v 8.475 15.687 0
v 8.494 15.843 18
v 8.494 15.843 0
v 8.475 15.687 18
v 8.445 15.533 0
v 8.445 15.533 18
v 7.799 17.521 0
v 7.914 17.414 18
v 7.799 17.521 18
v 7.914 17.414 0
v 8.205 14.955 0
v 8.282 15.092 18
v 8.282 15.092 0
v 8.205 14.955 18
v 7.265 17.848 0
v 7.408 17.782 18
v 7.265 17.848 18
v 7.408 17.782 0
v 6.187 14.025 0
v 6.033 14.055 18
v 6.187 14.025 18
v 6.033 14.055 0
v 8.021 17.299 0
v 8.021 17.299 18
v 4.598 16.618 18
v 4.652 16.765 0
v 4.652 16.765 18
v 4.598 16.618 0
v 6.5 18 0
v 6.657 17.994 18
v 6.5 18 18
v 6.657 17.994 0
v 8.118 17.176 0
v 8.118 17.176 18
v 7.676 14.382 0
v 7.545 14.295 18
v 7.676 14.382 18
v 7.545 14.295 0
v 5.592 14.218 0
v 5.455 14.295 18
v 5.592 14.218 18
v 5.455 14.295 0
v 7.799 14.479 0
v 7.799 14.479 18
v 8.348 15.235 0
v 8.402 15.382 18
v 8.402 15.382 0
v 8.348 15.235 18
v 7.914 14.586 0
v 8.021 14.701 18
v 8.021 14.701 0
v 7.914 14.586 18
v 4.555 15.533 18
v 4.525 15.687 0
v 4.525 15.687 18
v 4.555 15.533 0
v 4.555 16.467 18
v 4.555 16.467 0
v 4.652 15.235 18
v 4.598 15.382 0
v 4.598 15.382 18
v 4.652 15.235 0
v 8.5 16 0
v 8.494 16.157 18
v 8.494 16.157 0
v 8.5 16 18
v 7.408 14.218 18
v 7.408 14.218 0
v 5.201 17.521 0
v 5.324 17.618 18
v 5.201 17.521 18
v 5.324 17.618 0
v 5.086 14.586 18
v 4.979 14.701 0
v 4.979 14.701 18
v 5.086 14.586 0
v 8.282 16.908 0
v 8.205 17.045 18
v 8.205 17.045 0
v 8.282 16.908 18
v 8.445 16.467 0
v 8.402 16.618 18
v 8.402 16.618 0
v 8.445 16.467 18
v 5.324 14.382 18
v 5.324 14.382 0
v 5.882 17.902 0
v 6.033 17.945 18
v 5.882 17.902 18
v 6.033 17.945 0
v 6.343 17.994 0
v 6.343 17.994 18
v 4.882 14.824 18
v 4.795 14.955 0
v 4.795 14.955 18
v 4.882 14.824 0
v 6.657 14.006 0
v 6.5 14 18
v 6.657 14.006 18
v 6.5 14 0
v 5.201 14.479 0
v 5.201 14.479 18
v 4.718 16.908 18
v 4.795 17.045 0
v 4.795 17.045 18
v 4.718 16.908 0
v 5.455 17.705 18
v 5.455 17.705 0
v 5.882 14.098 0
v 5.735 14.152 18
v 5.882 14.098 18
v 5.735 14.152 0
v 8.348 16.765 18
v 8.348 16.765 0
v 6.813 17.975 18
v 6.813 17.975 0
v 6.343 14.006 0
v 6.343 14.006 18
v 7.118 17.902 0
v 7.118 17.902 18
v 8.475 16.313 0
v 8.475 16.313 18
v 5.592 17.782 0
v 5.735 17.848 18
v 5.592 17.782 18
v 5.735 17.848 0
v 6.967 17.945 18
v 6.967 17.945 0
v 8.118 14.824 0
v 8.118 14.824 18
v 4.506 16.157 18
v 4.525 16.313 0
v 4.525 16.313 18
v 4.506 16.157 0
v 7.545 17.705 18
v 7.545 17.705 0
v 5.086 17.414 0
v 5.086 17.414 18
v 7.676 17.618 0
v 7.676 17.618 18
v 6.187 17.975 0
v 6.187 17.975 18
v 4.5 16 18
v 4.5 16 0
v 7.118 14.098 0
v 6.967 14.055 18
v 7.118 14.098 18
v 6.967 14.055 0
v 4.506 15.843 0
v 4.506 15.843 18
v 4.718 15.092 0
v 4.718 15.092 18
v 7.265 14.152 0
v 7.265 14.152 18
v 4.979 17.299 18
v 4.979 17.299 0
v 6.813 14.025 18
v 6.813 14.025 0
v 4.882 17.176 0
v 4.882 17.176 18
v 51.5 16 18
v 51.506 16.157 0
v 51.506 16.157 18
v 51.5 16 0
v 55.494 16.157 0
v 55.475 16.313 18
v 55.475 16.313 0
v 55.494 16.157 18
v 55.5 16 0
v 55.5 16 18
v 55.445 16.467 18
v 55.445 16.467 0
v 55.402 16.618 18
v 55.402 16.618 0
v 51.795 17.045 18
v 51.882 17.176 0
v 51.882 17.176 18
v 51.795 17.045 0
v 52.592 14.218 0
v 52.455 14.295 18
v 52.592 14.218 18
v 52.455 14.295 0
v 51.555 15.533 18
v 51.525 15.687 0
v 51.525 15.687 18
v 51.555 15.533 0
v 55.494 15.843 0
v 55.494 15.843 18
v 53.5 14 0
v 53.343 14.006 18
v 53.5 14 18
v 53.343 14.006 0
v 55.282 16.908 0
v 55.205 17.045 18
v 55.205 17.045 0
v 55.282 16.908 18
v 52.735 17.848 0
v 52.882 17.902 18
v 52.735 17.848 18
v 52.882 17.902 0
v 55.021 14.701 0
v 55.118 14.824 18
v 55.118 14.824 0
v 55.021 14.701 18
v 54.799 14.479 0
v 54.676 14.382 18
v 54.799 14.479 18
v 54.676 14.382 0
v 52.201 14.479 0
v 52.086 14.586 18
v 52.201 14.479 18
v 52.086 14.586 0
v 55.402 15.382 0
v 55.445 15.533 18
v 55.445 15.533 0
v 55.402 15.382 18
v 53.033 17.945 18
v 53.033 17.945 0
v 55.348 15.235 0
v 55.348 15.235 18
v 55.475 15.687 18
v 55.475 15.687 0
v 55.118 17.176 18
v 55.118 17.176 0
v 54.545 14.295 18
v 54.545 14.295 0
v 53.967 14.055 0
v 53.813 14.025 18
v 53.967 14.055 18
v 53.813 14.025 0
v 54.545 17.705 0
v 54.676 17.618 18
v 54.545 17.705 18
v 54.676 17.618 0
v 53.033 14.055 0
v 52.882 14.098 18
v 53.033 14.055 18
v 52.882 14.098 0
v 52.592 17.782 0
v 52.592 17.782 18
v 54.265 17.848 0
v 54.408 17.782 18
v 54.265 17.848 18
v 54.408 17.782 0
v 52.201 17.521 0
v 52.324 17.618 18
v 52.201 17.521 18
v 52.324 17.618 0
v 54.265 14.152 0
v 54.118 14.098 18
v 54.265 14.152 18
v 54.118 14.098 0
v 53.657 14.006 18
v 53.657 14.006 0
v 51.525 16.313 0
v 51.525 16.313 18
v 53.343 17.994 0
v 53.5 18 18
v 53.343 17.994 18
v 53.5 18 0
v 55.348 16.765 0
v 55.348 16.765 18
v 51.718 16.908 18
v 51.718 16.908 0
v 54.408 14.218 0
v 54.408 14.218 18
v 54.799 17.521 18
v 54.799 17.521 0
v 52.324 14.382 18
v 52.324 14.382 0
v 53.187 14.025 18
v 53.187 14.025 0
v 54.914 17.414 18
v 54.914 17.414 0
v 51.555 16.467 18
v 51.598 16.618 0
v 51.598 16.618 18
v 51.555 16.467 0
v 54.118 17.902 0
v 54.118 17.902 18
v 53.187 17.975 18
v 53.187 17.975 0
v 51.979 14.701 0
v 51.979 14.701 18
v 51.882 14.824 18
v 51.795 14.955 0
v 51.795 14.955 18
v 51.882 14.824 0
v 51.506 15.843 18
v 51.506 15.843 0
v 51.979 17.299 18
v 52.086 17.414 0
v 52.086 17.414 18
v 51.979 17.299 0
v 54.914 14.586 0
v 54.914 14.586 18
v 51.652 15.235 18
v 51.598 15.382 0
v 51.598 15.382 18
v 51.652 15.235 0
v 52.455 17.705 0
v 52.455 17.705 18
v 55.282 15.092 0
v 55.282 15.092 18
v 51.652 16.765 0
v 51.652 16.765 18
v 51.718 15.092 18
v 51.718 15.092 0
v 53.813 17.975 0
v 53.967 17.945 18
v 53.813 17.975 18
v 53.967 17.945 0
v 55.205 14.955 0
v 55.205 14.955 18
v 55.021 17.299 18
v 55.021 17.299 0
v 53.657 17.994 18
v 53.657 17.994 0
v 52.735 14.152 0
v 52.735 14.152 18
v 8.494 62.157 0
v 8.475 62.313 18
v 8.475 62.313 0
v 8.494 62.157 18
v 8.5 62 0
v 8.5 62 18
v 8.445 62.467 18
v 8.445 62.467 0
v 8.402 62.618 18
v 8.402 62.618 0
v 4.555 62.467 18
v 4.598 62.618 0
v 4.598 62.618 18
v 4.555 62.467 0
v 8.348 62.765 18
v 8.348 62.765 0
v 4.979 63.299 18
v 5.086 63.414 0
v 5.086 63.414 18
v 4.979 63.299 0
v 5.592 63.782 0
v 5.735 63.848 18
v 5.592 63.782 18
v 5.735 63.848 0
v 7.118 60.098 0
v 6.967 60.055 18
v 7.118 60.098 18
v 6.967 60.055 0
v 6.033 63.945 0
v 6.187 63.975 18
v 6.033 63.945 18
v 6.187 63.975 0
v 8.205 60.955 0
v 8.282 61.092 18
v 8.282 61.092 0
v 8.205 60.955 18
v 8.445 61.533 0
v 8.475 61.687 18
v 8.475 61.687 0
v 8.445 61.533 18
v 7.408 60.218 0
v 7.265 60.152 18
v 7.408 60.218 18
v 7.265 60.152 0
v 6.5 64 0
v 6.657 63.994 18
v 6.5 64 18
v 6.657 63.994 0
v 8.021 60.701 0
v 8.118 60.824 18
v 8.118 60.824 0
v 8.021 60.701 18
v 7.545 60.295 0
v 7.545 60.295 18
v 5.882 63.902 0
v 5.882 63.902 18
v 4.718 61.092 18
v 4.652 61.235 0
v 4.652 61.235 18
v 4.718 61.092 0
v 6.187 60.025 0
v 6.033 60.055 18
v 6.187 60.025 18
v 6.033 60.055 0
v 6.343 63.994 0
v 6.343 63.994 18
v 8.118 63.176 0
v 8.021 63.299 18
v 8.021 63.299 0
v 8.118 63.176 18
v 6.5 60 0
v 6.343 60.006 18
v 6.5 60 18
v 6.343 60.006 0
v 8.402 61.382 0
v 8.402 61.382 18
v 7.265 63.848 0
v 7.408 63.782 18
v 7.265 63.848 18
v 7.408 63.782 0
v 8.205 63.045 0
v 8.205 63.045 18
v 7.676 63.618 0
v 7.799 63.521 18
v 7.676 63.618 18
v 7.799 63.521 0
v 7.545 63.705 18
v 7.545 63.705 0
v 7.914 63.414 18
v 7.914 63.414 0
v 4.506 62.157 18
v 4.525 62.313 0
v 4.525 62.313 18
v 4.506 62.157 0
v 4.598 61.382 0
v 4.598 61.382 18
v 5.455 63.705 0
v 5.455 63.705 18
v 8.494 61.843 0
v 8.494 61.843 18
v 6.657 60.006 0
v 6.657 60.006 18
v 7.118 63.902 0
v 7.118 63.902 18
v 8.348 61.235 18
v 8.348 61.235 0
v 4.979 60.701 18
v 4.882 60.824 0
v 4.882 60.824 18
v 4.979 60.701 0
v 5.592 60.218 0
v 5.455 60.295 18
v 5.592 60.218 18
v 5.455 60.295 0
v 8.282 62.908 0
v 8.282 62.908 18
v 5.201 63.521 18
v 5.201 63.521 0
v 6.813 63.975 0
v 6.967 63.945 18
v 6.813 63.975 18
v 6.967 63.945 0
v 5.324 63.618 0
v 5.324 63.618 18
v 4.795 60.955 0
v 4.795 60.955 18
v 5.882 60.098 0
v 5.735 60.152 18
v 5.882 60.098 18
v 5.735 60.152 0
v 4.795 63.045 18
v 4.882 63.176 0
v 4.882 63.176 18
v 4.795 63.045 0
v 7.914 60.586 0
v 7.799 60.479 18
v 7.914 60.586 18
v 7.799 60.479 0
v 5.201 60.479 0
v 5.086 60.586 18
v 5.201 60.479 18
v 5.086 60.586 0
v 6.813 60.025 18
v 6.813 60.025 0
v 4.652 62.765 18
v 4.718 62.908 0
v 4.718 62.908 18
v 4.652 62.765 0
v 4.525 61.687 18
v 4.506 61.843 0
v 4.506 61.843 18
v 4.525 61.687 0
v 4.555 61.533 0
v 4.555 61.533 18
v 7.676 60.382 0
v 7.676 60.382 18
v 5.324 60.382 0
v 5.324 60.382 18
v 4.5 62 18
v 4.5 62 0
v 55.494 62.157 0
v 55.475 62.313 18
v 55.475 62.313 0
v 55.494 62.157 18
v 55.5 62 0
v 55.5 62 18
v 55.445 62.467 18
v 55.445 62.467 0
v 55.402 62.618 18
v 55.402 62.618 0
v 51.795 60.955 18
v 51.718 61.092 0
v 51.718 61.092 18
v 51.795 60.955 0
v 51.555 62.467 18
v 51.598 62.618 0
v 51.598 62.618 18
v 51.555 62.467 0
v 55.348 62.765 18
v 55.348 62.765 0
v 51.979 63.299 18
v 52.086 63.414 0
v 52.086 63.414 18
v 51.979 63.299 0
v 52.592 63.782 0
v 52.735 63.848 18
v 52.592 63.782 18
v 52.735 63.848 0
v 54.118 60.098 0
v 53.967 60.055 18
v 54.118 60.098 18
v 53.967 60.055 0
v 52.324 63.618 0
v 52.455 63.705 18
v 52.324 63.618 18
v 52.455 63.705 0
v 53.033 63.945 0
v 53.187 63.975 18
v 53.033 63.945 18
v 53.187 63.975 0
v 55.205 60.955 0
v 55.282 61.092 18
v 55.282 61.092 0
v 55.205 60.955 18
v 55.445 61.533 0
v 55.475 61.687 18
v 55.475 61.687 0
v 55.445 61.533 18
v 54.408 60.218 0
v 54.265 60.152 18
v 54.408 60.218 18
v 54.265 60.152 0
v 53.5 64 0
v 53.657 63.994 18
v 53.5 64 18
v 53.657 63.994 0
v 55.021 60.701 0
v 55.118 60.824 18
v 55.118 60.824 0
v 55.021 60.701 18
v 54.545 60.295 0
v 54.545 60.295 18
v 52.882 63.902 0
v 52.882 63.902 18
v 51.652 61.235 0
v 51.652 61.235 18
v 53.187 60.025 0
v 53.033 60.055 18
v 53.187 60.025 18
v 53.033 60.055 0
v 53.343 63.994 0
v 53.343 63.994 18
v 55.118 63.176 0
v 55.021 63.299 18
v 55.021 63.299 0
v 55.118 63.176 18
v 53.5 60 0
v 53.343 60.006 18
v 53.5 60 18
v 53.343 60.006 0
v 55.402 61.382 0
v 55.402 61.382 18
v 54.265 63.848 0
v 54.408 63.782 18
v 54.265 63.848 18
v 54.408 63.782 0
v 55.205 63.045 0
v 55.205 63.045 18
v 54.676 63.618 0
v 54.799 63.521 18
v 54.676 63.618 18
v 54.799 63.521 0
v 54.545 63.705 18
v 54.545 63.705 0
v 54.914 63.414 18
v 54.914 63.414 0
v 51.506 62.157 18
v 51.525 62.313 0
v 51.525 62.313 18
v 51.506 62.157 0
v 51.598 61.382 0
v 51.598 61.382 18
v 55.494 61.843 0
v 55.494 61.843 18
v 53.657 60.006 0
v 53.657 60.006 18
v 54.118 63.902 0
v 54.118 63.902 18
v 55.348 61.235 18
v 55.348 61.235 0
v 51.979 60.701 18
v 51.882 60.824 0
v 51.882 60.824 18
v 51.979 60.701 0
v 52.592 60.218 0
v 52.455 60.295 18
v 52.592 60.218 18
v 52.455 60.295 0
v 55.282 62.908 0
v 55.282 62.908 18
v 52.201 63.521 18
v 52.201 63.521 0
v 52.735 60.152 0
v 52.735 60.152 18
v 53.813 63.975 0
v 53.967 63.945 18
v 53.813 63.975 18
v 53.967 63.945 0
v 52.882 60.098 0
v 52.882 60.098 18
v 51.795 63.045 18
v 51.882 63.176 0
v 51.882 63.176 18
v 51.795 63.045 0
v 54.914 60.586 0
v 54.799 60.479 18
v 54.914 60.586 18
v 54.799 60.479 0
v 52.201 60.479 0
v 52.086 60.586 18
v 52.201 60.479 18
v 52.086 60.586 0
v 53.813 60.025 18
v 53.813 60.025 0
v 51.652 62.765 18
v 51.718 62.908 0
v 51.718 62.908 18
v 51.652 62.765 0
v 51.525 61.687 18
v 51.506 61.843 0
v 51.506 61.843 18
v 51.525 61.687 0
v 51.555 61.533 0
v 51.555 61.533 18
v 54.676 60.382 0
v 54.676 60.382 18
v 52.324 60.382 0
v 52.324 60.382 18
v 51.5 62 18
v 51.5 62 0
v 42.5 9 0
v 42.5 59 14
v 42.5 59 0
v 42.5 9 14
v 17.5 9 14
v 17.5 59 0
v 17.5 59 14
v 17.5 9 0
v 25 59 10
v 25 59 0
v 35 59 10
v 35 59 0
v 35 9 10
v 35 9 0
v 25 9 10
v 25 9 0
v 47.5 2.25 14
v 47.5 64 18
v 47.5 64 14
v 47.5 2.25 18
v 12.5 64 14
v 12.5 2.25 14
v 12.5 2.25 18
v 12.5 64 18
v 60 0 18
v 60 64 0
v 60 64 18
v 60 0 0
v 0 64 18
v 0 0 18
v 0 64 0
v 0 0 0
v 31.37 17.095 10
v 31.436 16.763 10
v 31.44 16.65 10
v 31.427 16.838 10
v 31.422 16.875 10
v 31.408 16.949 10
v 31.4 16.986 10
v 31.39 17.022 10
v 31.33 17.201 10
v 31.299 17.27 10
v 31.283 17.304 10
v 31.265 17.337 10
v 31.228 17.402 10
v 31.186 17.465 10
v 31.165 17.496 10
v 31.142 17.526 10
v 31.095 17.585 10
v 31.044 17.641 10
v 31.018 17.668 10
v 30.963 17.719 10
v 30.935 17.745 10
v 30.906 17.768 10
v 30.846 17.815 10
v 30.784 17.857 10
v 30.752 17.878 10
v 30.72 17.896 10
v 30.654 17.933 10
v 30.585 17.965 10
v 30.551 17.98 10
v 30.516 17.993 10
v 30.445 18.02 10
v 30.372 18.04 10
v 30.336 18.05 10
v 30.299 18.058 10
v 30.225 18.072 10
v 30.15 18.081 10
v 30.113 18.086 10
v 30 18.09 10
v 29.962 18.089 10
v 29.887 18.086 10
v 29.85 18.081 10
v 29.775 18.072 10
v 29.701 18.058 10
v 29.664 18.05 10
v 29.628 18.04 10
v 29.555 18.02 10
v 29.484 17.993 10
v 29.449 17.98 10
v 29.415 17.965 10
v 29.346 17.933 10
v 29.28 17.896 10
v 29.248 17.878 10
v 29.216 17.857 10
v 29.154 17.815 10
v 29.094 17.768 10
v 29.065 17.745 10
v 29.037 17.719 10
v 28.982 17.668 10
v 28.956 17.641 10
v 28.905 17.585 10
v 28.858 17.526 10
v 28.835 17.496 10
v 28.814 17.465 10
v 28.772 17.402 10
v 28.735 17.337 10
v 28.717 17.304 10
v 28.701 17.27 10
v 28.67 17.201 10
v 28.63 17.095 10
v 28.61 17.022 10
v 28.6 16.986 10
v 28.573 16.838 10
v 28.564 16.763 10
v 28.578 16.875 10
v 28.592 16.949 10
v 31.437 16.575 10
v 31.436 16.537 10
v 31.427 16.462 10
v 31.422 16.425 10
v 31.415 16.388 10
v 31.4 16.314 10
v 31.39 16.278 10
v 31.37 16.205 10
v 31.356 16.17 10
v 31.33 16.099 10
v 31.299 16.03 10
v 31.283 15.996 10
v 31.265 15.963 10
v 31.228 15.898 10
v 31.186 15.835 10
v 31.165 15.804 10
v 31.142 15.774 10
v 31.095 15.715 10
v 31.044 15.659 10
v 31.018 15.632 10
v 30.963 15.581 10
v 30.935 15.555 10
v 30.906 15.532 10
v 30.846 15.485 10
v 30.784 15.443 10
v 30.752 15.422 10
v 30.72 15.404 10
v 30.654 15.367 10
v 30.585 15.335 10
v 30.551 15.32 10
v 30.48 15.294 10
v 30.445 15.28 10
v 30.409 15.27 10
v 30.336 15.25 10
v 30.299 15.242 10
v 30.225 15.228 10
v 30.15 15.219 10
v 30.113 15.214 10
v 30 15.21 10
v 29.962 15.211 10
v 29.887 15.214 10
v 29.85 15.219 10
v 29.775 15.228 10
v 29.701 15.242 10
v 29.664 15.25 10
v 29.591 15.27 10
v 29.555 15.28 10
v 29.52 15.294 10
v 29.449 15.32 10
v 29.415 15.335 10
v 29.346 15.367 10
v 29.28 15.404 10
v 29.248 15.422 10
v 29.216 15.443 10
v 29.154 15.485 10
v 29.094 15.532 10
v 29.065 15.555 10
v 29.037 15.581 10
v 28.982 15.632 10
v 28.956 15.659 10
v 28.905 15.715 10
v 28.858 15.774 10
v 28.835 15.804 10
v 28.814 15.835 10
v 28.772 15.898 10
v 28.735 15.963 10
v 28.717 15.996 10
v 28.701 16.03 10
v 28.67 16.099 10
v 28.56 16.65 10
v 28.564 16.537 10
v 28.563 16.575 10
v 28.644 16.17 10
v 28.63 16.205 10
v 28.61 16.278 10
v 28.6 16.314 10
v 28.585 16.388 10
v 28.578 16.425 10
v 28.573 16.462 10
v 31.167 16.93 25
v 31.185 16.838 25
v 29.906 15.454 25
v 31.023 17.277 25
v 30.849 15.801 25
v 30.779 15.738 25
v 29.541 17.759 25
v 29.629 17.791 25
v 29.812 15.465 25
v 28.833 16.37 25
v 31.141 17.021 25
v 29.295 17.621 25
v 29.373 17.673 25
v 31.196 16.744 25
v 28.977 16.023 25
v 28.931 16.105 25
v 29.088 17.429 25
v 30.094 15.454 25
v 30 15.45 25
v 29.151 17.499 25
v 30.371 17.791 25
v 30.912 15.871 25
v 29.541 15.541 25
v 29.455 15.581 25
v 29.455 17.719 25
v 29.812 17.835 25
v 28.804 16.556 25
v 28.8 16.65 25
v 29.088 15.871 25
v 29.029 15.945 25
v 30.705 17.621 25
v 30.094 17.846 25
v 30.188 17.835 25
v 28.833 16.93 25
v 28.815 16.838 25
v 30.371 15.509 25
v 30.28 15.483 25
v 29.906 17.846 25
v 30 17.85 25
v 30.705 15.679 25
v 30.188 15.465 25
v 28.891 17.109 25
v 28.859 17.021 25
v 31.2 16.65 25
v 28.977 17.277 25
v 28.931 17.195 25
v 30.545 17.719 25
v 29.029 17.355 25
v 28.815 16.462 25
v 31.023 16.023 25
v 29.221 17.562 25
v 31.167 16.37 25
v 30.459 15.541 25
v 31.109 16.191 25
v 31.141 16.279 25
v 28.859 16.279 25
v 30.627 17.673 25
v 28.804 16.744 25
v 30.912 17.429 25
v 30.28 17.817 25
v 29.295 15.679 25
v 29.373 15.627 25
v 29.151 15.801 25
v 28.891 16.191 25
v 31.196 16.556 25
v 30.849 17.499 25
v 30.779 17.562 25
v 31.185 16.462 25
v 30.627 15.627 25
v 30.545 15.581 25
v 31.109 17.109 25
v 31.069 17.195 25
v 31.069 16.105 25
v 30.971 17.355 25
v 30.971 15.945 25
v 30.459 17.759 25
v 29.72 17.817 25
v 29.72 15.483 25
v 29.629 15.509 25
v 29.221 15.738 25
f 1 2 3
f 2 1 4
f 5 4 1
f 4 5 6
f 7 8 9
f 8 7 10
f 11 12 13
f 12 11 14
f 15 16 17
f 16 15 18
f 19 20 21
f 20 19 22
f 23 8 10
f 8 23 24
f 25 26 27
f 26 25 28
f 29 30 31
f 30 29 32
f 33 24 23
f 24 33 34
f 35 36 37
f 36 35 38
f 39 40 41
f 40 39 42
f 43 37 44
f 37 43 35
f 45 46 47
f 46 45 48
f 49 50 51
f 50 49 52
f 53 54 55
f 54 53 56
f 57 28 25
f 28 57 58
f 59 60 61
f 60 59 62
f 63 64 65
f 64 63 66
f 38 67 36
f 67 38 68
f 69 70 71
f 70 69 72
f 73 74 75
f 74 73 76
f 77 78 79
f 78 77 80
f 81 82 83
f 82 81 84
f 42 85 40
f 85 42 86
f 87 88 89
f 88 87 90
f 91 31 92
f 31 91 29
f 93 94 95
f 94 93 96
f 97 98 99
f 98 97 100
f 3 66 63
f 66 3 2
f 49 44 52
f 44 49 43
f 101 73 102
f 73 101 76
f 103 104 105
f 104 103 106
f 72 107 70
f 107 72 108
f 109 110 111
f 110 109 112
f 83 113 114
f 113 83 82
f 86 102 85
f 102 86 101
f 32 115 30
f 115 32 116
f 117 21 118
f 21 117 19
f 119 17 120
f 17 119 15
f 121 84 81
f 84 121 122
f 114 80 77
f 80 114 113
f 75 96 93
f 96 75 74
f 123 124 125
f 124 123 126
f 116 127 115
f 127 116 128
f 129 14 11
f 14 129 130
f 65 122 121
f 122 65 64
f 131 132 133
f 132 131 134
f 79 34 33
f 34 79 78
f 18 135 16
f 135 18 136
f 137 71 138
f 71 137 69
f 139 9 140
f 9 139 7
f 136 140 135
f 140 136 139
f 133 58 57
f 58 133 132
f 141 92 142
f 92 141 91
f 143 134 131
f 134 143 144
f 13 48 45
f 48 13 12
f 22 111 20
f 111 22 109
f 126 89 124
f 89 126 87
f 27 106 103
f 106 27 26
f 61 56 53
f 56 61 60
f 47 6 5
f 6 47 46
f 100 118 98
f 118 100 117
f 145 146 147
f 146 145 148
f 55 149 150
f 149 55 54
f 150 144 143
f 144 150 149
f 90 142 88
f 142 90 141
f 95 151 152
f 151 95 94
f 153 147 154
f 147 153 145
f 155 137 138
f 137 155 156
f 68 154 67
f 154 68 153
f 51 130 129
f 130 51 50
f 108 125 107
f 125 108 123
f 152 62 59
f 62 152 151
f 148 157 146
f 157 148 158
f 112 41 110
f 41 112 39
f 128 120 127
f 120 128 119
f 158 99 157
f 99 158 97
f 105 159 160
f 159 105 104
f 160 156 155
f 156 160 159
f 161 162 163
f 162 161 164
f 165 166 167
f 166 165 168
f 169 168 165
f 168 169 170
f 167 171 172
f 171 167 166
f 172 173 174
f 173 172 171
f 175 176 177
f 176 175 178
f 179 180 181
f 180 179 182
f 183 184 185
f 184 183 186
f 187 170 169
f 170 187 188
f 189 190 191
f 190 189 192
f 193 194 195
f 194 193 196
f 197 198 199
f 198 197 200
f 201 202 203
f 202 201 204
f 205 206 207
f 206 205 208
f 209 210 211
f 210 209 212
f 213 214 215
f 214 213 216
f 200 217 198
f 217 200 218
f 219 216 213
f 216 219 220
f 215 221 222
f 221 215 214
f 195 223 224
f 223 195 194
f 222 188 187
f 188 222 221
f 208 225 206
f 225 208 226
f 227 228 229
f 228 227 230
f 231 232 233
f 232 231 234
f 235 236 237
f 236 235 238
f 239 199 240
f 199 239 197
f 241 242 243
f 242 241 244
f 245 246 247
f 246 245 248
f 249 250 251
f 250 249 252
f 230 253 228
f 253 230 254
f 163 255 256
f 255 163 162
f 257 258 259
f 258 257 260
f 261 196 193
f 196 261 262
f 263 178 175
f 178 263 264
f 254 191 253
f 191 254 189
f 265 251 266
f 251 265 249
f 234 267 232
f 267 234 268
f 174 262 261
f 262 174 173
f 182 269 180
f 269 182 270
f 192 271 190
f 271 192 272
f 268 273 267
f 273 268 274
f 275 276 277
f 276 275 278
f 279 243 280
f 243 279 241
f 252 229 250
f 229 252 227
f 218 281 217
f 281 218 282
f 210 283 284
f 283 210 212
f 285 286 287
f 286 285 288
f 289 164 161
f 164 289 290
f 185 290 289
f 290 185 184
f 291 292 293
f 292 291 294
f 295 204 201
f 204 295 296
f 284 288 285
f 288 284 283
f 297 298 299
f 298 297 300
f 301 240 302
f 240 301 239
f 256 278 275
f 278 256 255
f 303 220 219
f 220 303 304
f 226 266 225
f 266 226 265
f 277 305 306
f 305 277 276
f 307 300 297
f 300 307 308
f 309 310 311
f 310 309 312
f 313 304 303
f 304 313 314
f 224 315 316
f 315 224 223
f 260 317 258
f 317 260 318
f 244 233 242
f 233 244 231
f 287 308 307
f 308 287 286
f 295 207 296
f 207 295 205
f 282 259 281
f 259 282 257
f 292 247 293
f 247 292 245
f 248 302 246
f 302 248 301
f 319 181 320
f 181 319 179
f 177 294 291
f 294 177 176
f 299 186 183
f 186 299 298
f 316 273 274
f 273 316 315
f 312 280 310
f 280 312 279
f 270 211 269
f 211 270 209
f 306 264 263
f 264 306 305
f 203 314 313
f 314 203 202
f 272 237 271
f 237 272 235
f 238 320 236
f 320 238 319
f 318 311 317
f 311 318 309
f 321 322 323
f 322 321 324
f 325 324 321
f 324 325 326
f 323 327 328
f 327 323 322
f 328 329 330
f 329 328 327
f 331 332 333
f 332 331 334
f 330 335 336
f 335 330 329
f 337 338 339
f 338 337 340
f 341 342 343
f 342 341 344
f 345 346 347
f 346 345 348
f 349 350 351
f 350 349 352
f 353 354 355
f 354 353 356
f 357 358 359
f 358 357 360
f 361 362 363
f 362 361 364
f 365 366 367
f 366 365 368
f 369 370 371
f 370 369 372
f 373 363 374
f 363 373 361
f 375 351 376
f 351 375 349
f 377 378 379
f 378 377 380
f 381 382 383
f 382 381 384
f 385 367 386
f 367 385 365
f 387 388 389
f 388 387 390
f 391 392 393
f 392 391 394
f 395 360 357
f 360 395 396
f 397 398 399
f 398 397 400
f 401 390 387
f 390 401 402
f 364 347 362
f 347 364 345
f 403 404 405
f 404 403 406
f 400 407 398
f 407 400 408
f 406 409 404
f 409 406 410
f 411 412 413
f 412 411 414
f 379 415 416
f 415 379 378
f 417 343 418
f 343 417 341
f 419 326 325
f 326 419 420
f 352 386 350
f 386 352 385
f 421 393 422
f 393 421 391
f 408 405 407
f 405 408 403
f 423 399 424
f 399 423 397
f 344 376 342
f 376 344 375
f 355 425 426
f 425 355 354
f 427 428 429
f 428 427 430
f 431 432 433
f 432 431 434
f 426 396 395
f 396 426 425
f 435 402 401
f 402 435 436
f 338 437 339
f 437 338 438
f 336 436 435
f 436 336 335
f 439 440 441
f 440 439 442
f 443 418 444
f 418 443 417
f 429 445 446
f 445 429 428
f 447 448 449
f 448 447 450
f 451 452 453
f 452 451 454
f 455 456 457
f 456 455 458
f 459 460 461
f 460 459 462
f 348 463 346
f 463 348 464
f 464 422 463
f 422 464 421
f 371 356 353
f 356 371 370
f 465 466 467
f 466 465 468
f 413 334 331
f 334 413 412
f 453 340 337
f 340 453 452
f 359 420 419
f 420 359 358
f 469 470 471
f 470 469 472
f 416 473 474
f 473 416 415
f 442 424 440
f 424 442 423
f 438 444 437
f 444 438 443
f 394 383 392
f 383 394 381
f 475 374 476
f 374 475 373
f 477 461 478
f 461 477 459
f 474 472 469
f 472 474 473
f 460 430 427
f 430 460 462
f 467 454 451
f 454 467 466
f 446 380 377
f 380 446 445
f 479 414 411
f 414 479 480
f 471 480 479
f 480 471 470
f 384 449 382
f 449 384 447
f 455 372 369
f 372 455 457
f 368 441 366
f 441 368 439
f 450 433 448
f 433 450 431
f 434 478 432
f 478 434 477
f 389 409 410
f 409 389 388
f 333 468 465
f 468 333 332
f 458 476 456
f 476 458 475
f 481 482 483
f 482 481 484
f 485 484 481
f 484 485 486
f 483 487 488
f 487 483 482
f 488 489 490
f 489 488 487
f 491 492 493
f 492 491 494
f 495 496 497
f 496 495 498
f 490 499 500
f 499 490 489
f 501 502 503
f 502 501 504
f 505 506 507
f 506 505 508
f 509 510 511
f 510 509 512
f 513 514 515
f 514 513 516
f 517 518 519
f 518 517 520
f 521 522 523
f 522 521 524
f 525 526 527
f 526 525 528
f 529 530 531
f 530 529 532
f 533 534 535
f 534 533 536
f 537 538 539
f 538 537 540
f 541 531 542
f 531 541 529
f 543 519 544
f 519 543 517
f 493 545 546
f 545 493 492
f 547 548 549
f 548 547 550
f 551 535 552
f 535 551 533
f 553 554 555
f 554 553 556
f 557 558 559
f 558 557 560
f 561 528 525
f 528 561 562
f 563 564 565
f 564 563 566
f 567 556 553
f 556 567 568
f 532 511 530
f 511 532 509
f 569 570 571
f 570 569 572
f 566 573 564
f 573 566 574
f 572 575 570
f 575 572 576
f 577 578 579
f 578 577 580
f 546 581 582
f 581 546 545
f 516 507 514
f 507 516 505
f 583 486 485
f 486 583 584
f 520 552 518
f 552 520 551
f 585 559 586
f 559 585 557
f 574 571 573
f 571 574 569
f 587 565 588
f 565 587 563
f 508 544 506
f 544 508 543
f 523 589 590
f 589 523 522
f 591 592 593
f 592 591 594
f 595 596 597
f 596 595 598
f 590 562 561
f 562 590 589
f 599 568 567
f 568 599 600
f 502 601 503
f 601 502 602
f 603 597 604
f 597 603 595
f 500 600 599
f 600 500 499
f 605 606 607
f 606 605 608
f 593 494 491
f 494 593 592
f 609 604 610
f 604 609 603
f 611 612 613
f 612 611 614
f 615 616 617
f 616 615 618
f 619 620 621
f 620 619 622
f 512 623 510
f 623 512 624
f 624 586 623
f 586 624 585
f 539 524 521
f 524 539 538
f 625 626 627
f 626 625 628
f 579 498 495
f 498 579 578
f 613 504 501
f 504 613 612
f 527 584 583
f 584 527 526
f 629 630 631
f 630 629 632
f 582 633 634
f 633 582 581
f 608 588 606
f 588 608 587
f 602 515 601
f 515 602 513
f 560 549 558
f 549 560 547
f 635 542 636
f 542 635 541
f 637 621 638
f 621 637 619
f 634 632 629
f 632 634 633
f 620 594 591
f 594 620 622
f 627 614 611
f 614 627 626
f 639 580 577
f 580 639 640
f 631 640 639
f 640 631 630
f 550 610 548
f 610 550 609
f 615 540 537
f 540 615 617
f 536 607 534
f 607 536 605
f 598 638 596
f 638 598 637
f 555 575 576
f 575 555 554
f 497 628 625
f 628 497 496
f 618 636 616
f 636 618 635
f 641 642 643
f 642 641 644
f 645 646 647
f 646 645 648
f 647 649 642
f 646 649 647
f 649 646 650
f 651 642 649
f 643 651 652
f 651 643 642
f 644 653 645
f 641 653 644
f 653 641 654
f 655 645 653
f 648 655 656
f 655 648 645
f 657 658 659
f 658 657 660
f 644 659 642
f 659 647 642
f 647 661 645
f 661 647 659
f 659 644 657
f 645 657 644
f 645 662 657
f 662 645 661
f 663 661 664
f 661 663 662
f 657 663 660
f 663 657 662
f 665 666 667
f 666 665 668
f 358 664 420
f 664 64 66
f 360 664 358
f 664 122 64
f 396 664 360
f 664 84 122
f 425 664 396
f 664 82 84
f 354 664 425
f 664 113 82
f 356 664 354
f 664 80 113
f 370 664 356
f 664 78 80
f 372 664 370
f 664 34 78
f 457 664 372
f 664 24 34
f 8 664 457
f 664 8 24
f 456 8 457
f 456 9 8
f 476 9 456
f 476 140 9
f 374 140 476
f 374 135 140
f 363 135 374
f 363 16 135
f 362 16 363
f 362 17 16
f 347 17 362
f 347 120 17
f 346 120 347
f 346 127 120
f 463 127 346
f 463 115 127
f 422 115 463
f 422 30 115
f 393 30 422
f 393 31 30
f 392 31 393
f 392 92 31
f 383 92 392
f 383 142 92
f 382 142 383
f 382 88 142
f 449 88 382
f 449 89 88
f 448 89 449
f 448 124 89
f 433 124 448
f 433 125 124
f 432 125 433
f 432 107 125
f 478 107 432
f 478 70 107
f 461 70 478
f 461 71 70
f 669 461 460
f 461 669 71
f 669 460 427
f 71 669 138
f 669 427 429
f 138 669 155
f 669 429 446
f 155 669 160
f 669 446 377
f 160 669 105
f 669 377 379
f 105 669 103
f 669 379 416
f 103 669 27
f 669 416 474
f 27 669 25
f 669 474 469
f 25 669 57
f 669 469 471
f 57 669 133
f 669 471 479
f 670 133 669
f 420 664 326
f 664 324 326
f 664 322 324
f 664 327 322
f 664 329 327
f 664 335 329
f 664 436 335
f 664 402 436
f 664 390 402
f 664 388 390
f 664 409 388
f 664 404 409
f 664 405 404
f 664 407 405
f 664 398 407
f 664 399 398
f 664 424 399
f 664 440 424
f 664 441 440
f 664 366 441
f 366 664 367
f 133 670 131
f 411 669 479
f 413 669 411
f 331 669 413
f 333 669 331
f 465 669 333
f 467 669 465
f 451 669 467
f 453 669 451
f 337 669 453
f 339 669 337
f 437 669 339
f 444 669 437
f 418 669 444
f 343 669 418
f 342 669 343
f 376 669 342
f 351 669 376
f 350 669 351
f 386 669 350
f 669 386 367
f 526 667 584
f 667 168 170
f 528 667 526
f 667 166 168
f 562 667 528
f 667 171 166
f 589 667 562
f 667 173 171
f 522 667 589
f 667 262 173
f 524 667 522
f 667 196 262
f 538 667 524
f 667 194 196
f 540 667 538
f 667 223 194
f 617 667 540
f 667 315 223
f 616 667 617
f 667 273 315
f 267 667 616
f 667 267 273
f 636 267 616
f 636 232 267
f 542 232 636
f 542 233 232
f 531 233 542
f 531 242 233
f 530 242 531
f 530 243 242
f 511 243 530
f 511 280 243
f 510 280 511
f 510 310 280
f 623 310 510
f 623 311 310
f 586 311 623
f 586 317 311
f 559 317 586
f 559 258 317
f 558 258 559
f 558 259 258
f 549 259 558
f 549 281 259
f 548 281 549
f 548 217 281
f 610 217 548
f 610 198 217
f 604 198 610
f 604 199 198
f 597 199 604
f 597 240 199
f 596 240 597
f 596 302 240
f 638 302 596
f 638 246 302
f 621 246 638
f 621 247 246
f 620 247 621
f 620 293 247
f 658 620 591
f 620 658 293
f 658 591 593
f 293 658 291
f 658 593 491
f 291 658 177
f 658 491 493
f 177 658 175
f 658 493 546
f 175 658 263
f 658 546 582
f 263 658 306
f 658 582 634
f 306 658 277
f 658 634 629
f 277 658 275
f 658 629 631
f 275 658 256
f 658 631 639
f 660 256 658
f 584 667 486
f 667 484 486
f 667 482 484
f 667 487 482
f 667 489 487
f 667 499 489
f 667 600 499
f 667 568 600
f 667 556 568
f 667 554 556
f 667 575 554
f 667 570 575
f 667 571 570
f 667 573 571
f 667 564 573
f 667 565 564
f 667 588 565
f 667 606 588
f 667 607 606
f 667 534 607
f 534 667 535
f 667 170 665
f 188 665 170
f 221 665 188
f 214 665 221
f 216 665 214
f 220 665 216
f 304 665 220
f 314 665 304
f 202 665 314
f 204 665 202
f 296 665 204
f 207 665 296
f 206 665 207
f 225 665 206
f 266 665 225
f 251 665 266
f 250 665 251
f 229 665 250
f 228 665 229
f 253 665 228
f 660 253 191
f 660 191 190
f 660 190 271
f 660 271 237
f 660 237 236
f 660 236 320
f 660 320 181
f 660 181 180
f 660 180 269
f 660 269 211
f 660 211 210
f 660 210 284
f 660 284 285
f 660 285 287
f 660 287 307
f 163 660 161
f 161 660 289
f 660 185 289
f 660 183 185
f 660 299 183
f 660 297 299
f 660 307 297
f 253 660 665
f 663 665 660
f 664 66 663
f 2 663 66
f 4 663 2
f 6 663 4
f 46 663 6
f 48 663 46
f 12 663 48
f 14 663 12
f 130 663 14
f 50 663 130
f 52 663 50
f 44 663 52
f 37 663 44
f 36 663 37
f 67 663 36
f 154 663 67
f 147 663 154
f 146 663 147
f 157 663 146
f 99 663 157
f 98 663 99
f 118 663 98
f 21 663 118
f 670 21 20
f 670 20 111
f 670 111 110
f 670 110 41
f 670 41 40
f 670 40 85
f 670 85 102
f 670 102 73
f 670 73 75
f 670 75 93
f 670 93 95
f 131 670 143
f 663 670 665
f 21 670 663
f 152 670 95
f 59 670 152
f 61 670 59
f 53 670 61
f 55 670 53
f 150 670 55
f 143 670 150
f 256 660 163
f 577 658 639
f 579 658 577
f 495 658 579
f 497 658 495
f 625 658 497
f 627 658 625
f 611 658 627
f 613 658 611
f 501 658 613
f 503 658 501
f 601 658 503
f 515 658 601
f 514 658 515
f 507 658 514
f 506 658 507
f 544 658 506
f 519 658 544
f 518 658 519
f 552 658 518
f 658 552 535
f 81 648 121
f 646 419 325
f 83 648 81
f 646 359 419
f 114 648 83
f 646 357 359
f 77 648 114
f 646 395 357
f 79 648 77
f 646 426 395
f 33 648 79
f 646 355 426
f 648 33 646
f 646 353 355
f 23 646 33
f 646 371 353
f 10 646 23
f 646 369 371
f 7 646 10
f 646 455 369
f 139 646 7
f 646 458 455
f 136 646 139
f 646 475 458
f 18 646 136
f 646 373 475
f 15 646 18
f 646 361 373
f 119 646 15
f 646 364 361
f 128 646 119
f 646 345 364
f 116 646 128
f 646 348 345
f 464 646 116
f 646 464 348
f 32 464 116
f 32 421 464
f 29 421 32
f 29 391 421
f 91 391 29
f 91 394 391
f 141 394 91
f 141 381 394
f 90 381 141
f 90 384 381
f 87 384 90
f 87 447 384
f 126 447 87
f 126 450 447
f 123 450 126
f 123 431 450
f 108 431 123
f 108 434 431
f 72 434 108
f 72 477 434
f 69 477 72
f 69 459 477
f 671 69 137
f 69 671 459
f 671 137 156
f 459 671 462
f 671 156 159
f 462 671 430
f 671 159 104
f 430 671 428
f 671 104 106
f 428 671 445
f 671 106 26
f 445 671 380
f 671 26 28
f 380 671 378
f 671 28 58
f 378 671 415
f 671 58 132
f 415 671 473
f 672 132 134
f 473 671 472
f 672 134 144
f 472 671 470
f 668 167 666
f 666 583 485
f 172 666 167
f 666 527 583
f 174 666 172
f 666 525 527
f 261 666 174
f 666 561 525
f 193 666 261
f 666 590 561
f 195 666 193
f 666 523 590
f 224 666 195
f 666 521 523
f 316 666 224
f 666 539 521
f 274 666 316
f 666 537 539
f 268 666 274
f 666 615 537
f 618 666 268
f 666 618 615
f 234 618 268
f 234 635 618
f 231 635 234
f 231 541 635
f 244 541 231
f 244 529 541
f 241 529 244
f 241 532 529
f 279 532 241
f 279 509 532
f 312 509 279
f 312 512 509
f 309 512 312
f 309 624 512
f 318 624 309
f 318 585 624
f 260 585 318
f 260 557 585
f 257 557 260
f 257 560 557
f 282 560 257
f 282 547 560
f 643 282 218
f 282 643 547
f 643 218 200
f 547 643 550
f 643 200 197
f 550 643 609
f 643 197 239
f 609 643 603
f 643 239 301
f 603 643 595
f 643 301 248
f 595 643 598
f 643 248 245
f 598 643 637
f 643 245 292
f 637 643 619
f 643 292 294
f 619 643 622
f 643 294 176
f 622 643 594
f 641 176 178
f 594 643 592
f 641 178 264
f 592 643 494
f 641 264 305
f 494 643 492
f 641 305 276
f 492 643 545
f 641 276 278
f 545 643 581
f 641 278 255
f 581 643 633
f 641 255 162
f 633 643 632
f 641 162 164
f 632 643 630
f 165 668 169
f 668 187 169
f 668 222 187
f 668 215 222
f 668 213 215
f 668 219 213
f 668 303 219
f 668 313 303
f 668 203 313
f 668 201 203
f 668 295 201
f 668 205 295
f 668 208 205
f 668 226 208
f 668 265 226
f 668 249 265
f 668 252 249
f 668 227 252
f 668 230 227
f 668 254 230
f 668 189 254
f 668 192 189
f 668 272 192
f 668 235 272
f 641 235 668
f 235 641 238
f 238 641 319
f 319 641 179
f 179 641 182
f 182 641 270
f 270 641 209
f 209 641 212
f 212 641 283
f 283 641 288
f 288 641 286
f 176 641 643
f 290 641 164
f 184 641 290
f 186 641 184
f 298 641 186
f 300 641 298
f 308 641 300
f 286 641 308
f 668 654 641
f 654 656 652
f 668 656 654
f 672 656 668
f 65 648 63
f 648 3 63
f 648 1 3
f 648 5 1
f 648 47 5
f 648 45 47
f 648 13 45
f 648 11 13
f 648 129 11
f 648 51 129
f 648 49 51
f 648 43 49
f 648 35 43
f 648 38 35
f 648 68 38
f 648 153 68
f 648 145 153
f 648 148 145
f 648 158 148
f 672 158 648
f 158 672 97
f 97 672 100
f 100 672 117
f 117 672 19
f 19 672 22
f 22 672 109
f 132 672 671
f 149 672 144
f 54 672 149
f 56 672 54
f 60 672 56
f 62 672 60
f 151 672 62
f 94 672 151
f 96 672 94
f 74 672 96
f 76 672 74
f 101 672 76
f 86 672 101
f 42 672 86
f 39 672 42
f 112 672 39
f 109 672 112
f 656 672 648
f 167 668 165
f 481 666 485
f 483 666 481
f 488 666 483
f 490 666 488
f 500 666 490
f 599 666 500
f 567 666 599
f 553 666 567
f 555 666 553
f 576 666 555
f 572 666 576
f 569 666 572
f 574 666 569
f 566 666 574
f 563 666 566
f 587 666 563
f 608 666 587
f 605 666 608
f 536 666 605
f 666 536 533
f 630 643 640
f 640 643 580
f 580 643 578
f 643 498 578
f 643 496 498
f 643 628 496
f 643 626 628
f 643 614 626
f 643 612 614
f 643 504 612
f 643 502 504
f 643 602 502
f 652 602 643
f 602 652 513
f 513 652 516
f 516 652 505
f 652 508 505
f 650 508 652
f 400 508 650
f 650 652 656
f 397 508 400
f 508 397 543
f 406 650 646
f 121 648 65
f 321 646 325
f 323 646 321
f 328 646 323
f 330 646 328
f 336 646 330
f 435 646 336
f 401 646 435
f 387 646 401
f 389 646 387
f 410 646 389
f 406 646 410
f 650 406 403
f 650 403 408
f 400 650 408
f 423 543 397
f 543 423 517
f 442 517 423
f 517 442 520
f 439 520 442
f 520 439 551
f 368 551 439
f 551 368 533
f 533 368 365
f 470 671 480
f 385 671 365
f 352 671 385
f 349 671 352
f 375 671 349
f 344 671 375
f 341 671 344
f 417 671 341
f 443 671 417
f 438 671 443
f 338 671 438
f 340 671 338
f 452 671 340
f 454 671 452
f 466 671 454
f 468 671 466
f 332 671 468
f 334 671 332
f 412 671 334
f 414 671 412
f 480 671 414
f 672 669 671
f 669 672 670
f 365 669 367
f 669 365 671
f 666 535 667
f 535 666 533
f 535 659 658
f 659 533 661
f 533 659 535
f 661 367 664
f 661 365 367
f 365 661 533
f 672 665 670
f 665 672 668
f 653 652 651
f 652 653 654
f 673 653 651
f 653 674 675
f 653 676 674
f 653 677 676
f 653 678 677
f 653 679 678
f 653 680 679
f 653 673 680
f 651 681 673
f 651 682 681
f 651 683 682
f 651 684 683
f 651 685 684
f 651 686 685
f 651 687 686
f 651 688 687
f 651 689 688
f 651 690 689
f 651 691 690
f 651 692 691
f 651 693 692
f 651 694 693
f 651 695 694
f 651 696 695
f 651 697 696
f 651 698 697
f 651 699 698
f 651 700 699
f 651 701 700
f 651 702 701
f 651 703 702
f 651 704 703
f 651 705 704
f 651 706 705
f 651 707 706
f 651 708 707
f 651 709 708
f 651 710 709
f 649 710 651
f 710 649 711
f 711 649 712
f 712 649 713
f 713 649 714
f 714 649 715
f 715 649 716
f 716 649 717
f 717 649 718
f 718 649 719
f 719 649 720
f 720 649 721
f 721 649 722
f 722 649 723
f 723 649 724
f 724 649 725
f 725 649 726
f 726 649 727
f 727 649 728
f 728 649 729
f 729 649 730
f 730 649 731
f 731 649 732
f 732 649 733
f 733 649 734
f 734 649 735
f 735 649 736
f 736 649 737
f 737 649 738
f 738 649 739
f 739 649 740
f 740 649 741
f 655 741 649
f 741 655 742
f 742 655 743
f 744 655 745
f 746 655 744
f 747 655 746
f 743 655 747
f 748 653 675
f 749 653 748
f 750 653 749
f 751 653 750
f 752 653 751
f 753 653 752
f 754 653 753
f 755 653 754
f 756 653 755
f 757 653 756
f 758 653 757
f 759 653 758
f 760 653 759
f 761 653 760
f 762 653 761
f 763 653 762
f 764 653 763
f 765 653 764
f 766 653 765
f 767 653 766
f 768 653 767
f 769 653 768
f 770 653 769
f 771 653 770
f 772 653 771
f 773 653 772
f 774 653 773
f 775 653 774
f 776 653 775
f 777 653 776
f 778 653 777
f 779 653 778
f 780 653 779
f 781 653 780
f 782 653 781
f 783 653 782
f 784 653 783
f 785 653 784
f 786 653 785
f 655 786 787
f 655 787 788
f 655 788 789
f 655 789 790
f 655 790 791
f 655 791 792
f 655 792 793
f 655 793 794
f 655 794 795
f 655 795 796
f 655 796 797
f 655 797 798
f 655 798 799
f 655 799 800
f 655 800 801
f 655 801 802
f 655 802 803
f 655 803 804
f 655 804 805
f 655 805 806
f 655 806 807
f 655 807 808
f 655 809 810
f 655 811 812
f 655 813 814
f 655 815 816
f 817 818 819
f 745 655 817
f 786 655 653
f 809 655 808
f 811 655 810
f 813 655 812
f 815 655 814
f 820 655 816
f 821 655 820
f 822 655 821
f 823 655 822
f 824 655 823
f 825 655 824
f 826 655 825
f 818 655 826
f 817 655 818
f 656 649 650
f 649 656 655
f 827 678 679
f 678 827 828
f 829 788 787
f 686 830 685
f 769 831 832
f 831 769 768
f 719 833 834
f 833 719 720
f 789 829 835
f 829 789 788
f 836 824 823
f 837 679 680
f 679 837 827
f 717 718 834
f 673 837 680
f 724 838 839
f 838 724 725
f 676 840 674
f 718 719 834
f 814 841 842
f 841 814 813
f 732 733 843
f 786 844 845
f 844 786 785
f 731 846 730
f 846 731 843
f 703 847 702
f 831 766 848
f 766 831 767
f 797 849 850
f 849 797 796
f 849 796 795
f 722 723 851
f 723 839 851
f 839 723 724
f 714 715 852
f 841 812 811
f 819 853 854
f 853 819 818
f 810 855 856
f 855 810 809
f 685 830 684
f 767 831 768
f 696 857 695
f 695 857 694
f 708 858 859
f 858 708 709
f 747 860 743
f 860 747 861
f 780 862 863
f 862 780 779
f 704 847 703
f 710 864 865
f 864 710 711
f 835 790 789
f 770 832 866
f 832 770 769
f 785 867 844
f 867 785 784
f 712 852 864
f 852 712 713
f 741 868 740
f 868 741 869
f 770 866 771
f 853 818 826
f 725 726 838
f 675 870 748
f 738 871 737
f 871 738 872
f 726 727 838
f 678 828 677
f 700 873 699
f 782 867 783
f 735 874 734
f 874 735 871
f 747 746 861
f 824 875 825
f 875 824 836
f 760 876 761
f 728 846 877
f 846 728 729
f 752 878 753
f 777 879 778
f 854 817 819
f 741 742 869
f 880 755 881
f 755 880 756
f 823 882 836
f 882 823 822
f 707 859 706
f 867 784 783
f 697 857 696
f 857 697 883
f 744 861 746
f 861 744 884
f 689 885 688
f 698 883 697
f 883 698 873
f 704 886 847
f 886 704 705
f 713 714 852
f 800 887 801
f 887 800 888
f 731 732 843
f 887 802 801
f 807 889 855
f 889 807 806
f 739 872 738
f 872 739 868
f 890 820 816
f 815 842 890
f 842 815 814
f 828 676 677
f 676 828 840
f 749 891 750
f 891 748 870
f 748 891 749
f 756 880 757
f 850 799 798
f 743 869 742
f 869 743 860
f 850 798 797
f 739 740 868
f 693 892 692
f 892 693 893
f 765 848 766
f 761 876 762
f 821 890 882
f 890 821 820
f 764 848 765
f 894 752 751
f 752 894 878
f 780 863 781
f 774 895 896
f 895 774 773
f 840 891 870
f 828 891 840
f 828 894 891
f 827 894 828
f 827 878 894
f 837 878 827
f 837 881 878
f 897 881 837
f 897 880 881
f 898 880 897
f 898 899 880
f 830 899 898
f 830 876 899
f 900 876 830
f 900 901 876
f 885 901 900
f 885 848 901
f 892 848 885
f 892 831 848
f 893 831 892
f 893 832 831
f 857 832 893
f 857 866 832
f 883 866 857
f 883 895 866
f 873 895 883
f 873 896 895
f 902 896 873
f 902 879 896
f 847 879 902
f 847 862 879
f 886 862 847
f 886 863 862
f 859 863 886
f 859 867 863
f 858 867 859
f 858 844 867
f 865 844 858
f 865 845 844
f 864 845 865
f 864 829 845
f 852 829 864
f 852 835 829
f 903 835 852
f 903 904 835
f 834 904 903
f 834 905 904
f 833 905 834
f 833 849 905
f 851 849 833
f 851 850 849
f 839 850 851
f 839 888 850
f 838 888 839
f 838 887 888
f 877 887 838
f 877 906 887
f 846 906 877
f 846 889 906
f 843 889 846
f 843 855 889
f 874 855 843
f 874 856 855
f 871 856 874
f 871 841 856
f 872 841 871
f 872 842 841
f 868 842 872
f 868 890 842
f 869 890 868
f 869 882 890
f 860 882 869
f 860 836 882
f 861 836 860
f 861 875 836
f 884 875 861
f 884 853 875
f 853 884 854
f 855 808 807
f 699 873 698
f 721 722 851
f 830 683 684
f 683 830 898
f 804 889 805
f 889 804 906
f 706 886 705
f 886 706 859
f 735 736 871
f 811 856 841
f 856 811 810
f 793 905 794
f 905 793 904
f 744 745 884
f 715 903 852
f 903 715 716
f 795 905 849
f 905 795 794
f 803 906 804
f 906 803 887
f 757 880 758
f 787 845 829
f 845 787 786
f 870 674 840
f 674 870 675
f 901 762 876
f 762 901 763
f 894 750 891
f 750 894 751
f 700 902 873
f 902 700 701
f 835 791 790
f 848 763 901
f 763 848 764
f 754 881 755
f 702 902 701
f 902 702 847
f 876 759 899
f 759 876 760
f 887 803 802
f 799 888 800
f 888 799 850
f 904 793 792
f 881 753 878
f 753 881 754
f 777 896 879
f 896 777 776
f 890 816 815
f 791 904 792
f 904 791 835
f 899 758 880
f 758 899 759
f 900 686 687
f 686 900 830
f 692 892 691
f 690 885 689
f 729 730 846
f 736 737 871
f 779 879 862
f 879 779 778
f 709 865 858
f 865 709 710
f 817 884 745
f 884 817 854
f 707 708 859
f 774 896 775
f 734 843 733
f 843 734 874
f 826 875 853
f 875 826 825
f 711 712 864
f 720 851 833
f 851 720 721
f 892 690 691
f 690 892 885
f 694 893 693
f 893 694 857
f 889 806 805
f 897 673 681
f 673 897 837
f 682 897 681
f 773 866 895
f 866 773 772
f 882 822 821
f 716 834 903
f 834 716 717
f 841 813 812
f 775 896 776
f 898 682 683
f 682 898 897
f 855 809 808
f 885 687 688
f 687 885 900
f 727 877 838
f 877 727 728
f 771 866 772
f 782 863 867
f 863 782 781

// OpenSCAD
    
 $fn=80;
cubeWidth = 60;
cubeLength = 64;

// Test Fixture properties.
// How far infront of Pin1 the mounting hole is.
pin1ToMountingHoleDistance = 5.25;

// Board under test properties.
pin1ToPcbEdge =  8.5; //mm from front edge.
pcbWidth = 35; //mm
pcbLength = 96;

// block mounting hole is holesYOffset mm from the front edge.
module thermocouplePcbCutout(holesYOffset) {

    
// The position of pin one on the test fixture
pin1Position = holesYOffset - pin1ToMountingHoleDistance;    
frontEdgePosition = pin1Position - pin1ToPcbEdge;
xOffset = (cubeWidth - pcbWidth)/2;

echo (frontEdgePosition);
zOffset = 14;
    
    translate([xOffset, frontEdgePosition, zOffset]) {
        cube([pcbWidth, pcbLength, 20]);
    }
}

// block mounting hole is holesYOffset mm from the front edge.
module thermocouplePin(holesYOffset) {
offset = 14.4; // mm from front edge.
    
pin1Position = holesYOffset - pin1ToMountingHoleDistance;    
pin1ToPcbEdge =   8.5; //mm from front edge.
frontEdgePosition = pin1Position - pin1ToPcbEdge;
    
xOffset = (cubeWidth /2);
yOffset = frontEdgePosition + offset;
echo (yOffset);
    
    translate([xOffset, yOffset, 0]) {
        cylinder(d1=3.2, d2=2.4, h=25);
    }
}

module pogoPinsCutout() {
    cube([25, 50, 20]);
}

module mountHoles() {
    // Across = 47mm.
    // Down = 46mm.
    
    translate([0,0,0]) {
        #cylinder(d=4, h=30);
    }
    
    translate([47,0,0]) {
        #cylinder(d=4, h=30);
    }
    
    translate([0,46,0]) {
        #cylinder(d=4, h=30);
    }
    
    translate([47,46,0]) {
        #cylinder(d=4, h=30);
    }
    
}

module body() {

// holes are 47mm across.
// 60 - 47 = 13 
// 13/2 = 6.5
holesXOffset = (60-47) / 2;
holesYOffset = 16; // 16mm gap between ext test input and top hole.

    
// Pin 1 is 5.25mm from 
    
    difference() {
        union() {
            cube([cubeWidth, cubeLength, 18]);
        }
        
        union() {
            // Move 5 + (4/2) mm down for the hole.
            translate([holesXOffset,holesYOffset,-0.1]) {
                mountHoles();
            }
            
            // 14mm wide. so 7mm back from center.
            translate([30-(25/2),holesYOffset - 7,-0.1]) {
                pogoPinsCutout();
            }
            
            thermocouplePcbCutout(holesYOffset);
        }
    }
    
    
    // Fill in the middle bit to allow for a support pin
    translate([(cubeWidth / 2) -5, 0, 0]) {
        cube([10, cubeLength, 10]);
    }
    
    thermocouplePin(holesYOffset);
}



body();
